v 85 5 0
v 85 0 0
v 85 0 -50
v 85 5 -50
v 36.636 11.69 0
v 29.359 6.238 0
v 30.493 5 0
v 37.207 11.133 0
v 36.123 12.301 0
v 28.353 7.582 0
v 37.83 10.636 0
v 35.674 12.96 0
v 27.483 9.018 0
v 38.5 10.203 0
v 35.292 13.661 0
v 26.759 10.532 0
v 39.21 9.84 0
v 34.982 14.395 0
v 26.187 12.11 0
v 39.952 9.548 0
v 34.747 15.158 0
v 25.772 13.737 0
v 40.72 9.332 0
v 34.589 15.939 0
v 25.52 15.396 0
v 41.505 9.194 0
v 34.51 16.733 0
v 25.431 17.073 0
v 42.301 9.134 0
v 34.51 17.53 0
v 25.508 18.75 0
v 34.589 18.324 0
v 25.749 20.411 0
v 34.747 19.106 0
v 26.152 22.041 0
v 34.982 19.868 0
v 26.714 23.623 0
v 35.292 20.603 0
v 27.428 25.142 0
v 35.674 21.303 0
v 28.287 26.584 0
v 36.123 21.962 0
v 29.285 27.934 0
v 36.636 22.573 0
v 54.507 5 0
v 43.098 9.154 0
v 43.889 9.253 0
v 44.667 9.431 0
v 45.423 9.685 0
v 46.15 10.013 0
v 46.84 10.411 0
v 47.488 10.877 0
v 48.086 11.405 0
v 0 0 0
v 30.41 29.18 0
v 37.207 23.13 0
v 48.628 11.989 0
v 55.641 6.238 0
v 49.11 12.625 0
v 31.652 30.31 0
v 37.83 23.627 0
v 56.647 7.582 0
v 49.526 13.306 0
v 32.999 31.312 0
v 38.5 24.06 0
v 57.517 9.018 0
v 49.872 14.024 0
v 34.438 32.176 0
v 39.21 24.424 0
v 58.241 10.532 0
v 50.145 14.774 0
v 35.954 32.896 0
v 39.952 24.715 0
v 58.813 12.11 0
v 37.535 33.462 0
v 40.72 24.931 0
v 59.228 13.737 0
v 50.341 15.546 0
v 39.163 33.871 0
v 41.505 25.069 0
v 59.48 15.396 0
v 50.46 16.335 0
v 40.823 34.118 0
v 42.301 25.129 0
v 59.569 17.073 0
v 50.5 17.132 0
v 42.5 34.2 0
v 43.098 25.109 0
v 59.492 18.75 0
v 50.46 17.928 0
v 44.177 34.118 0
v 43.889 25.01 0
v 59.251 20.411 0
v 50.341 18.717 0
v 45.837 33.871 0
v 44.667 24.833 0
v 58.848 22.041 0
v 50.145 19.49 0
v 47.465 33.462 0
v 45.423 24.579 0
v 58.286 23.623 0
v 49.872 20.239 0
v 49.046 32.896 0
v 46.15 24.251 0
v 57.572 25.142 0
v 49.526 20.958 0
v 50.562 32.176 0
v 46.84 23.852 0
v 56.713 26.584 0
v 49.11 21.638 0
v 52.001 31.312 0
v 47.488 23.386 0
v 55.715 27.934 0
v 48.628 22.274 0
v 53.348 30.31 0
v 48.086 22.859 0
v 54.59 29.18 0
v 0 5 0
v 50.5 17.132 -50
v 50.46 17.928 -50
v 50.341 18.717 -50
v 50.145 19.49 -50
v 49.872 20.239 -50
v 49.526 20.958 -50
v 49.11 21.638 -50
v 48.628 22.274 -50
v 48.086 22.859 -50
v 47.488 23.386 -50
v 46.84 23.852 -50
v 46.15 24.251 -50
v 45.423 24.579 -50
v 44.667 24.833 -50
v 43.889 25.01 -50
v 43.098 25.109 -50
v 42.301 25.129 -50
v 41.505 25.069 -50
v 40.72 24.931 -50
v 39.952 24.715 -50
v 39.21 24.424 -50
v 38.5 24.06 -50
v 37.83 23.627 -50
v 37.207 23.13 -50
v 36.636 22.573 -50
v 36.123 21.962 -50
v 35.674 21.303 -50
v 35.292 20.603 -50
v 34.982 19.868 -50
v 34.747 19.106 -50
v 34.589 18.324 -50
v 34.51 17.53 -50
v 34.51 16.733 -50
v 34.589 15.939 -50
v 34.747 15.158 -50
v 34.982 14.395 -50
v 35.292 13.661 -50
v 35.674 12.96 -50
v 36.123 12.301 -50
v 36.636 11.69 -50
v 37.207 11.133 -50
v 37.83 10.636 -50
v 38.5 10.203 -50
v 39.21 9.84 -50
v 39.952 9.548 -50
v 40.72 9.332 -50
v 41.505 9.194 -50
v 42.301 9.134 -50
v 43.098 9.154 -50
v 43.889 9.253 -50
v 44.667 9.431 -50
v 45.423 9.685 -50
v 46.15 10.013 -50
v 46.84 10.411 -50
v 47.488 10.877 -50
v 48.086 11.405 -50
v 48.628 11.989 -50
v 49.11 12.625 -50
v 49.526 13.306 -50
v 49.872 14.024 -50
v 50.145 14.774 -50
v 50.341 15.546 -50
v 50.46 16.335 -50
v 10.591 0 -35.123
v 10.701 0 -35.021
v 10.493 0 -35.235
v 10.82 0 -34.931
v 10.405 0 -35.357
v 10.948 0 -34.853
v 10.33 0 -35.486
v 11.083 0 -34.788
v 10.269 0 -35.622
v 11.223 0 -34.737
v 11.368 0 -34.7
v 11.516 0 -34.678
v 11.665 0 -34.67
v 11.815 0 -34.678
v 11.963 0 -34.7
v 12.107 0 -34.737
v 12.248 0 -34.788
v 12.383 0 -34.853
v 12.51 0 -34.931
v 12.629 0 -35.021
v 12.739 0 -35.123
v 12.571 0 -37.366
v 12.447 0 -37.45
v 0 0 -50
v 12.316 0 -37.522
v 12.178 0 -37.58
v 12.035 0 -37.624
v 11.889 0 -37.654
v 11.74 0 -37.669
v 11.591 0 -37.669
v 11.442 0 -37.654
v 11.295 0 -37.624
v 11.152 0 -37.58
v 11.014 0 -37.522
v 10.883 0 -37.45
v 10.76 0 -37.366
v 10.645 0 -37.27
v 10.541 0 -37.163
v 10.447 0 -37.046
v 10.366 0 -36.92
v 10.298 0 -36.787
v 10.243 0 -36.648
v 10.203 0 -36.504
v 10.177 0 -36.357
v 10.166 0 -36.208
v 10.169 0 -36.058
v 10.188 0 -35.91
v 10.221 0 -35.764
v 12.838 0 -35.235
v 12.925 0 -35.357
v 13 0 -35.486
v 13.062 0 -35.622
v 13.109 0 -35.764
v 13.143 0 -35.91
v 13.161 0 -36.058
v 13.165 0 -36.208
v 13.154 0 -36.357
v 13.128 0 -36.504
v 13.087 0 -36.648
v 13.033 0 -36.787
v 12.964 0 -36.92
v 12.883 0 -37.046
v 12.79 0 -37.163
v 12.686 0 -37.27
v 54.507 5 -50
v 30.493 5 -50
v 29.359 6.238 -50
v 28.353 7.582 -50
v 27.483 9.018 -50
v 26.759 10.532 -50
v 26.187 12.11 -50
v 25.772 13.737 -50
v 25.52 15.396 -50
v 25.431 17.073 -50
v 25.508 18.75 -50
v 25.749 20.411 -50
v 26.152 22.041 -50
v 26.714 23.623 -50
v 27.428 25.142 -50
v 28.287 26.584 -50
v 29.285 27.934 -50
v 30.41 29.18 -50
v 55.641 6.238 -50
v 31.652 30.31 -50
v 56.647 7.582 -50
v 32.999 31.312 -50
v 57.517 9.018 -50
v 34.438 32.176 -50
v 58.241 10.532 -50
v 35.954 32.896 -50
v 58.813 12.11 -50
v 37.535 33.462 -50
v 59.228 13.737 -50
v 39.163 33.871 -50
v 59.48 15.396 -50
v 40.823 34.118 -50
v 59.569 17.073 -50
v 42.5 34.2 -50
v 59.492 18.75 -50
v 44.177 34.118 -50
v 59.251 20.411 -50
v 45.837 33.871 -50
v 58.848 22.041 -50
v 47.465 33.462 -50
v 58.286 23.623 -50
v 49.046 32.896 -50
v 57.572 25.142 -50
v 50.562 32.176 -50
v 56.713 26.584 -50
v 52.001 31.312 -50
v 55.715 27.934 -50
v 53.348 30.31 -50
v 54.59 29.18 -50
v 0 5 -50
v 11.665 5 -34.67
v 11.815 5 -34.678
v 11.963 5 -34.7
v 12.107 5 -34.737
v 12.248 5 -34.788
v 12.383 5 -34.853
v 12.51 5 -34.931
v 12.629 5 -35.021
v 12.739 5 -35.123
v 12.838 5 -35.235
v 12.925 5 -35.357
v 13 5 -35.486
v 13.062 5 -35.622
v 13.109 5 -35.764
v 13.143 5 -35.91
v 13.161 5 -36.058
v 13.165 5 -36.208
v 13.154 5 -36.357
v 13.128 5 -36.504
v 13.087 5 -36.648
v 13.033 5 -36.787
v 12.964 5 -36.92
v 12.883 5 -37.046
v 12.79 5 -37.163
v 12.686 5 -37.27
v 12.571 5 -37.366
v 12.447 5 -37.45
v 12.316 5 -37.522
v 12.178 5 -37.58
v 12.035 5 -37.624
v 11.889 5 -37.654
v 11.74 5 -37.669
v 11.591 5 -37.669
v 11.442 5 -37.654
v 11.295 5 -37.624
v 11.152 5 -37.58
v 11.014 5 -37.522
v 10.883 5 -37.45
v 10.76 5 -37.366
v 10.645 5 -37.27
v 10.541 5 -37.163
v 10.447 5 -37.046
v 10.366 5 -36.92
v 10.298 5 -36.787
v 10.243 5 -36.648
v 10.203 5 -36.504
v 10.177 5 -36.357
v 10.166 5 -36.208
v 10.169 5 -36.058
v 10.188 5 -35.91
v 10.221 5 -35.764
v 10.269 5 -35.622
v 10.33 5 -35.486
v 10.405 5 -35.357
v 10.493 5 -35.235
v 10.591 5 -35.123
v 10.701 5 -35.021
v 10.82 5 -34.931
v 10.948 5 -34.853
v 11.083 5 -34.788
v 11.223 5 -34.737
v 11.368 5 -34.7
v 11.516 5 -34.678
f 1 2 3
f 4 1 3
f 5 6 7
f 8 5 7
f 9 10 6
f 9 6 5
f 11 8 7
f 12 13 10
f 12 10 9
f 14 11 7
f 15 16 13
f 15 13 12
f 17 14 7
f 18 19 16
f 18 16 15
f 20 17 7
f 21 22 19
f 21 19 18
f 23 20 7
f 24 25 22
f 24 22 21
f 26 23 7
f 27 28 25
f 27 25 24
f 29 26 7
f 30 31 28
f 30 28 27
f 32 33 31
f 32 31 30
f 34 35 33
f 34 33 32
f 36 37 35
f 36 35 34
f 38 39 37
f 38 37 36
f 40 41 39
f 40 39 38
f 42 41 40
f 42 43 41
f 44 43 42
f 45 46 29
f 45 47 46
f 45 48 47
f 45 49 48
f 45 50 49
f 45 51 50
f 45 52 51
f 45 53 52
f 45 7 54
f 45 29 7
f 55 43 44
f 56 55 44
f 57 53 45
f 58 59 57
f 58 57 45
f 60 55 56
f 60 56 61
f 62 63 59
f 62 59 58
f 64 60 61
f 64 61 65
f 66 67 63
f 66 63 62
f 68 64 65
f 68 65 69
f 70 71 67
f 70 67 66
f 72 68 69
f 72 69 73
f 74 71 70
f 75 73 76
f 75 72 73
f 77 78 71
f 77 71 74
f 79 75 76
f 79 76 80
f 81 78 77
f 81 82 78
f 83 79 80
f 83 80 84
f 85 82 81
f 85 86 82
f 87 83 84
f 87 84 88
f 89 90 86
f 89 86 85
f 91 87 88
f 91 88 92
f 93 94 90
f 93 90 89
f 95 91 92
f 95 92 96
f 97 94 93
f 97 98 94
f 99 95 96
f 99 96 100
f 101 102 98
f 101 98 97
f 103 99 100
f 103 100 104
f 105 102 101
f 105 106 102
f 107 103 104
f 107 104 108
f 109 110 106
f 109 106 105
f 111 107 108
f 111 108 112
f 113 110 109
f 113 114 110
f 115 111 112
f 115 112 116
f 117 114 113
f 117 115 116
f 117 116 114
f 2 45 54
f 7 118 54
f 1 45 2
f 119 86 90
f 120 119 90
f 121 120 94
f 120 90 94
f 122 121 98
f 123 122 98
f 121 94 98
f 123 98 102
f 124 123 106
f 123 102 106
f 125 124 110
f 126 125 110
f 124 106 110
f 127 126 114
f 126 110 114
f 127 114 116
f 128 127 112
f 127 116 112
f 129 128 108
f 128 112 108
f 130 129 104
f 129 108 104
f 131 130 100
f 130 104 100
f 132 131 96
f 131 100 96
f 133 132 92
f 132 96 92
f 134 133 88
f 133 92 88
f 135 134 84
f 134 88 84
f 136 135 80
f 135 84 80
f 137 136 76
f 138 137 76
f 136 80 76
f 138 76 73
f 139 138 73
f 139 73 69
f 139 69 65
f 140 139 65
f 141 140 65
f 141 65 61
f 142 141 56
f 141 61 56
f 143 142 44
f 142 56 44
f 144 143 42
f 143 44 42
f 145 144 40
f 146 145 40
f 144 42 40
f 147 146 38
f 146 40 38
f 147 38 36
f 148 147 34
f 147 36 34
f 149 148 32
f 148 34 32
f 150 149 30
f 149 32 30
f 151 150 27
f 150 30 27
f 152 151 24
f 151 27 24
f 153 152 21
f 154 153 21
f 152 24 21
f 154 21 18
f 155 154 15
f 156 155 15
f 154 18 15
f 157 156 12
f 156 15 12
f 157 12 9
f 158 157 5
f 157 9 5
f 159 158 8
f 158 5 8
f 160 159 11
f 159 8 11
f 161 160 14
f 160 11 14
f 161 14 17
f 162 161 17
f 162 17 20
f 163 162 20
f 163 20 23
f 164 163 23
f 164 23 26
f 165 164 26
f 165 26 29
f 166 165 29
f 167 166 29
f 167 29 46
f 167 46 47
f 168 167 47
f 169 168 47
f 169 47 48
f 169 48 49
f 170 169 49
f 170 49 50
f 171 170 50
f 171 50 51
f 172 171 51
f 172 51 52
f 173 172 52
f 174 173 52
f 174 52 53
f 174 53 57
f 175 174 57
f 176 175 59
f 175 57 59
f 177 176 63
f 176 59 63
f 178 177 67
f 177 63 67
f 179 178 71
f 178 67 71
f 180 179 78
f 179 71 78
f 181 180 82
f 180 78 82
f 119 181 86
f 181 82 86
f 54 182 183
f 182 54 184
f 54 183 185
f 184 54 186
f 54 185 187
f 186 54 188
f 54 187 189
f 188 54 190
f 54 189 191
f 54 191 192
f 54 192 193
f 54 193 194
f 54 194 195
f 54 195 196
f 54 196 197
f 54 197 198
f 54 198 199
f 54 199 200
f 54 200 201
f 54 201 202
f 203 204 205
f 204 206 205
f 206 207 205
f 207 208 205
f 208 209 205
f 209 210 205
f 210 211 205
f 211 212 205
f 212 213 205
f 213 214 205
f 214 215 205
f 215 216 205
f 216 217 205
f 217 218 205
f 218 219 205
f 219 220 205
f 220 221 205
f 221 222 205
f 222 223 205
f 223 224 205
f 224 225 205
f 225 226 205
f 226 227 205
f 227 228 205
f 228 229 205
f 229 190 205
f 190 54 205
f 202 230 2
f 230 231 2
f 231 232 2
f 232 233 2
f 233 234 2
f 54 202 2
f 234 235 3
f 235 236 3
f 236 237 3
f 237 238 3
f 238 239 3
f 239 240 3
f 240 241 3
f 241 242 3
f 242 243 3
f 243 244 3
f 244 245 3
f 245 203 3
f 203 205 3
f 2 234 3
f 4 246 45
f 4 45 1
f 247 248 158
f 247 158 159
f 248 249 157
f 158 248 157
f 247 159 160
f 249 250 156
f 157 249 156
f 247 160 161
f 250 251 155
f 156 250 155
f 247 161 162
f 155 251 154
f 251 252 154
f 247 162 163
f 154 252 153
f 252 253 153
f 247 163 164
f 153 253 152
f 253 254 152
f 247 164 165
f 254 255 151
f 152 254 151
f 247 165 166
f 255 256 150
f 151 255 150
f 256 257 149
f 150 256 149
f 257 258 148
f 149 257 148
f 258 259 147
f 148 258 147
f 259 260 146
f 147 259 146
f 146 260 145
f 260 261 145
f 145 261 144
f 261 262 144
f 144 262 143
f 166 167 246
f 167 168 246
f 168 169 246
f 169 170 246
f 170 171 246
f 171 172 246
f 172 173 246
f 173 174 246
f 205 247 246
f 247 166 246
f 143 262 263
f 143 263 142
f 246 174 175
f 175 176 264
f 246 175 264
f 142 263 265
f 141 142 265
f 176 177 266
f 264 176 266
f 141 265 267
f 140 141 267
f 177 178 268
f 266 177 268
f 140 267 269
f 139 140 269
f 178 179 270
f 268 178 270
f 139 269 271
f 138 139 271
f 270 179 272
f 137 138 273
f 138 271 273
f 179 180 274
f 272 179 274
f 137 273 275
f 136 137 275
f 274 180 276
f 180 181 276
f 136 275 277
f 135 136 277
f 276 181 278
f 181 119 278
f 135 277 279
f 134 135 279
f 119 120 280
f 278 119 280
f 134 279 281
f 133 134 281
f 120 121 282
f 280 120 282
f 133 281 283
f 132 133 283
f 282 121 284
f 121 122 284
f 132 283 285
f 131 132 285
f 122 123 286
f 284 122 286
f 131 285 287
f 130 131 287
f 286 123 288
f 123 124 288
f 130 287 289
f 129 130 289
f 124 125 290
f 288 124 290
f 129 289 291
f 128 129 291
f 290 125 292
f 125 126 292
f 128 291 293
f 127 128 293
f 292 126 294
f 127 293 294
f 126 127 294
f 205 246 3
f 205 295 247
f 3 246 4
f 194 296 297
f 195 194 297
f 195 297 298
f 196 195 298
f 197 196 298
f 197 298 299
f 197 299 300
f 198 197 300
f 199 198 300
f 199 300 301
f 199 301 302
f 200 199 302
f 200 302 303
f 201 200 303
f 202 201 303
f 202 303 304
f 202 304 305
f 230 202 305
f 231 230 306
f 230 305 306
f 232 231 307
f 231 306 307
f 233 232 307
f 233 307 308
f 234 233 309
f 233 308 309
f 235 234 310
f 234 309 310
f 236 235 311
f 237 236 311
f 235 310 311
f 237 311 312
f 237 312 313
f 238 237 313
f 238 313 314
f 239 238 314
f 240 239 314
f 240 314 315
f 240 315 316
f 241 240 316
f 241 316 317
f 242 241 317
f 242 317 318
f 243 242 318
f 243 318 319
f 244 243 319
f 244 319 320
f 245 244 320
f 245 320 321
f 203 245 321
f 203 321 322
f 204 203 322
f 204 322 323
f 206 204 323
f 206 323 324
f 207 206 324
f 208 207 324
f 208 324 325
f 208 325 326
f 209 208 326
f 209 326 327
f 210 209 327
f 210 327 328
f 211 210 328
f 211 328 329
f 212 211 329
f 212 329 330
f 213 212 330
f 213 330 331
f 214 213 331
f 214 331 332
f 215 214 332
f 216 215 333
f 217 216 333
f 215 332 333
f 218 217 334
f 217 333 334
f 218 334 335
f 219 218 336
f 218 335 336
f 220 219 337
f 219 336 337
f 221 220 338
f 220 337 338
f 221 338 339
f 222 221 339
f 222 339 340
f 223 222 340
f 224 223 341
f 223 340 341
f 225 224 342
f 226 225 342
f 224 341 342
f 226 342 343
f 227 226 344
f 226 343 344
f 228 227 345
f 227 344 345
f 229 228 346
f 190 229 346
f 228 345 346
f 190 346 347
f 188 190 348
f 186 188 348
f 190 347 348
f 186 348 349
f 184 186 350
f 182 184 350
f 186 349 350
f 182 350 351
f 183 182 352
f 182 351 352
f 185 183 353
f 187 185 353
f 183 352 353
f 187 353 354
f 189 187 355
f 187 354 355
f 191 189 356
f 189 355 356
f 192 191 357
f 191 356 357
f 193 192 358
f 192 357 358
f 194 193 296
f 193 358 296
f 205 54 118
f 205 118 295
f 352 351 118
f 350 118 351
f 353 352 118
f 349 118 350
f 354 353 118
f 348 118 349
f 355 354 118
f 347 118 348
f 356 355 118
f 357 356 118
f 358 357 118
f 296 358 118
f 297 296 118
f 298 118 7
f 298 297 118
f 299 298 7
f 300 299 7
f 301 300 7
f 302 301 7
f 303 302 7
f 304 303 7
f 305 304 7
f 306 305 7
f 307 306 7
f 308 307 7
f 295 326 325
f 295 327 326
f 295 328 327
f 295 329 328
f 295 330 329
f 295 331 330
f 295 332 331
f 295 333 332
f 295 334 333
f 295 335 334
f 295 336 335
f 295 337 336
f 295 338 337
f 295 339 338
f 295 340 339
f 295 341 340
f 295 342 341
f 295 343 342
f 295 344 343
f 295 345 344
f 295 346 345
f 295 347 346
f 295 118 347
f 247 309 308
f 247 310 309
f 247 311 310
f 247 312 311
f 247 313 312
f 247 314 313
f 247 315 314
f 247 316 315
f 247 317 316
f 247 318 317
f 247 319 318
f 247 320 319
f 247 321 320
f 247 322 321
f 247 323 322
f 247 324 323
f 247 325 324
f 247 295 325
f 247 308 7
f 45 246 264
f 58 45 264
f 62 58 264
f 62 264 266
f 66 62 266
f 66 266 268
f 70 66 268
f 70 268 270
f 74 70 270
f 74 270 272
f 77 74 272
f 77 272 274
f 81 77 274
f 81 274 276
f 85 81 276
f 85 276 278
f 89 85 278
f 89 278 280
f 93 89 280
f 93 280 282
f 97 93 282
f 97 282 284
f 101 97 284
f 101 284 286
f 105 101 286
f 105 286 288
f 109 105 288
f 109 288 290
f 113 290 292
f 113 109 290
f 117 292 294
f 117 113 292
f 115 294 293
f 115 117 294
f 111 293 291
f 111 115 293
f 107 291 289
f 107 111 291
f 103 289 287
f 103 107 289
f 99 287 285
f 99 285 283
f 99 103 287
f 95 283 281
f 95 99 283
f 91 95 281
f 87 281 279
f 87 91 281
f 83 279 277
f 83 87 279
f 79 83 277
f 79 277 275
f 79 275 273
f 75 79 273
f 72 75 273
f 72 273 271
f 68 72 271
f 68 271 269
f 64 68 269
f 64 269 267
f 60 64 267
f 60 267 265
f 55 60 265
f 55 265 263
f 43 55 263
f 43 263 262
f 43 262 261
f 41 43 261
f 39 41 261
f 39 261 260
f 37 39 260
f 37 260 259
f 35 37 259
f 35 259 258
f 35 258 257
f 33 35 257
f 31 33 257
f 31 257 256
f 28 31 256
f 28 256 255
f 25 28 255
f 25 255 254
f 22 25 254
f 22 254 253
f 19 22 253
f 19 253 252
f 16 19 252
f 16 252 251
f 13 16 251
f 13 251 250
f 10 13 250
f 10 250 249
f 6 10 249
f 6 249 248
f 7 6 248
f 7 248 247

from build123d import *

# Parameters (mm, degrees)
SKETCH2_W           = 85
SKETCH2_H           = 50
BOSS_EXTRUDE2_DEPTH = 5
SKETCH3_R           = 17.0688374
SKETCH3_R_2         = 8
BOSS_EXTRUDE4_DEPTH = 50
SKETCH5_R           = 1.5
CUT_EXTRUDE1_DEPTH  = 50


with BuildPart() as part:
    # Sketch2 → Boss-Extrude2 (new body)
    with BuildSketch(Plane(origin=(0, 0, 0), x_dir=(1, 0, 0), z_dir=(0, 1, 0))):
        with Locations((42.5, 25)):
            Rectangle(SKETCH2_W, SKETCH2_H)
    extrude(amount=BOSS_EXTRUDE2_DEPTH)

    # Sketch3 → Boss-Extrude4 (add)
    with BuildSketch(Plane.XY):
        with Locations((42.5, 17.131570827)):
            Circle(SKETCH3_R)
        with Locations((42.5, 17.131570827)):
            Circle(SKETCH3_R_2, mode=Mode.SUBTRACT)
    extrude(amount=-BOSS_EXTRUDE4_DEPTH)

    # Sketch5 → Cut-Extrude1 (cut)
    with BuildSketch(Plane(origin=(0, 5, 0), x_dir=(1, 0, 0), z_dir=(0, 1, 0))):
        with Locations(Location((11.665290462, 36.170405123, 0), (0, 0, 270))):
            Circle(SKETCH5_R)
    extrude(amount=-CUT_EXTRUDE1_DEPTH, mode=Mode.SUBTRACT)


solid = part.part
